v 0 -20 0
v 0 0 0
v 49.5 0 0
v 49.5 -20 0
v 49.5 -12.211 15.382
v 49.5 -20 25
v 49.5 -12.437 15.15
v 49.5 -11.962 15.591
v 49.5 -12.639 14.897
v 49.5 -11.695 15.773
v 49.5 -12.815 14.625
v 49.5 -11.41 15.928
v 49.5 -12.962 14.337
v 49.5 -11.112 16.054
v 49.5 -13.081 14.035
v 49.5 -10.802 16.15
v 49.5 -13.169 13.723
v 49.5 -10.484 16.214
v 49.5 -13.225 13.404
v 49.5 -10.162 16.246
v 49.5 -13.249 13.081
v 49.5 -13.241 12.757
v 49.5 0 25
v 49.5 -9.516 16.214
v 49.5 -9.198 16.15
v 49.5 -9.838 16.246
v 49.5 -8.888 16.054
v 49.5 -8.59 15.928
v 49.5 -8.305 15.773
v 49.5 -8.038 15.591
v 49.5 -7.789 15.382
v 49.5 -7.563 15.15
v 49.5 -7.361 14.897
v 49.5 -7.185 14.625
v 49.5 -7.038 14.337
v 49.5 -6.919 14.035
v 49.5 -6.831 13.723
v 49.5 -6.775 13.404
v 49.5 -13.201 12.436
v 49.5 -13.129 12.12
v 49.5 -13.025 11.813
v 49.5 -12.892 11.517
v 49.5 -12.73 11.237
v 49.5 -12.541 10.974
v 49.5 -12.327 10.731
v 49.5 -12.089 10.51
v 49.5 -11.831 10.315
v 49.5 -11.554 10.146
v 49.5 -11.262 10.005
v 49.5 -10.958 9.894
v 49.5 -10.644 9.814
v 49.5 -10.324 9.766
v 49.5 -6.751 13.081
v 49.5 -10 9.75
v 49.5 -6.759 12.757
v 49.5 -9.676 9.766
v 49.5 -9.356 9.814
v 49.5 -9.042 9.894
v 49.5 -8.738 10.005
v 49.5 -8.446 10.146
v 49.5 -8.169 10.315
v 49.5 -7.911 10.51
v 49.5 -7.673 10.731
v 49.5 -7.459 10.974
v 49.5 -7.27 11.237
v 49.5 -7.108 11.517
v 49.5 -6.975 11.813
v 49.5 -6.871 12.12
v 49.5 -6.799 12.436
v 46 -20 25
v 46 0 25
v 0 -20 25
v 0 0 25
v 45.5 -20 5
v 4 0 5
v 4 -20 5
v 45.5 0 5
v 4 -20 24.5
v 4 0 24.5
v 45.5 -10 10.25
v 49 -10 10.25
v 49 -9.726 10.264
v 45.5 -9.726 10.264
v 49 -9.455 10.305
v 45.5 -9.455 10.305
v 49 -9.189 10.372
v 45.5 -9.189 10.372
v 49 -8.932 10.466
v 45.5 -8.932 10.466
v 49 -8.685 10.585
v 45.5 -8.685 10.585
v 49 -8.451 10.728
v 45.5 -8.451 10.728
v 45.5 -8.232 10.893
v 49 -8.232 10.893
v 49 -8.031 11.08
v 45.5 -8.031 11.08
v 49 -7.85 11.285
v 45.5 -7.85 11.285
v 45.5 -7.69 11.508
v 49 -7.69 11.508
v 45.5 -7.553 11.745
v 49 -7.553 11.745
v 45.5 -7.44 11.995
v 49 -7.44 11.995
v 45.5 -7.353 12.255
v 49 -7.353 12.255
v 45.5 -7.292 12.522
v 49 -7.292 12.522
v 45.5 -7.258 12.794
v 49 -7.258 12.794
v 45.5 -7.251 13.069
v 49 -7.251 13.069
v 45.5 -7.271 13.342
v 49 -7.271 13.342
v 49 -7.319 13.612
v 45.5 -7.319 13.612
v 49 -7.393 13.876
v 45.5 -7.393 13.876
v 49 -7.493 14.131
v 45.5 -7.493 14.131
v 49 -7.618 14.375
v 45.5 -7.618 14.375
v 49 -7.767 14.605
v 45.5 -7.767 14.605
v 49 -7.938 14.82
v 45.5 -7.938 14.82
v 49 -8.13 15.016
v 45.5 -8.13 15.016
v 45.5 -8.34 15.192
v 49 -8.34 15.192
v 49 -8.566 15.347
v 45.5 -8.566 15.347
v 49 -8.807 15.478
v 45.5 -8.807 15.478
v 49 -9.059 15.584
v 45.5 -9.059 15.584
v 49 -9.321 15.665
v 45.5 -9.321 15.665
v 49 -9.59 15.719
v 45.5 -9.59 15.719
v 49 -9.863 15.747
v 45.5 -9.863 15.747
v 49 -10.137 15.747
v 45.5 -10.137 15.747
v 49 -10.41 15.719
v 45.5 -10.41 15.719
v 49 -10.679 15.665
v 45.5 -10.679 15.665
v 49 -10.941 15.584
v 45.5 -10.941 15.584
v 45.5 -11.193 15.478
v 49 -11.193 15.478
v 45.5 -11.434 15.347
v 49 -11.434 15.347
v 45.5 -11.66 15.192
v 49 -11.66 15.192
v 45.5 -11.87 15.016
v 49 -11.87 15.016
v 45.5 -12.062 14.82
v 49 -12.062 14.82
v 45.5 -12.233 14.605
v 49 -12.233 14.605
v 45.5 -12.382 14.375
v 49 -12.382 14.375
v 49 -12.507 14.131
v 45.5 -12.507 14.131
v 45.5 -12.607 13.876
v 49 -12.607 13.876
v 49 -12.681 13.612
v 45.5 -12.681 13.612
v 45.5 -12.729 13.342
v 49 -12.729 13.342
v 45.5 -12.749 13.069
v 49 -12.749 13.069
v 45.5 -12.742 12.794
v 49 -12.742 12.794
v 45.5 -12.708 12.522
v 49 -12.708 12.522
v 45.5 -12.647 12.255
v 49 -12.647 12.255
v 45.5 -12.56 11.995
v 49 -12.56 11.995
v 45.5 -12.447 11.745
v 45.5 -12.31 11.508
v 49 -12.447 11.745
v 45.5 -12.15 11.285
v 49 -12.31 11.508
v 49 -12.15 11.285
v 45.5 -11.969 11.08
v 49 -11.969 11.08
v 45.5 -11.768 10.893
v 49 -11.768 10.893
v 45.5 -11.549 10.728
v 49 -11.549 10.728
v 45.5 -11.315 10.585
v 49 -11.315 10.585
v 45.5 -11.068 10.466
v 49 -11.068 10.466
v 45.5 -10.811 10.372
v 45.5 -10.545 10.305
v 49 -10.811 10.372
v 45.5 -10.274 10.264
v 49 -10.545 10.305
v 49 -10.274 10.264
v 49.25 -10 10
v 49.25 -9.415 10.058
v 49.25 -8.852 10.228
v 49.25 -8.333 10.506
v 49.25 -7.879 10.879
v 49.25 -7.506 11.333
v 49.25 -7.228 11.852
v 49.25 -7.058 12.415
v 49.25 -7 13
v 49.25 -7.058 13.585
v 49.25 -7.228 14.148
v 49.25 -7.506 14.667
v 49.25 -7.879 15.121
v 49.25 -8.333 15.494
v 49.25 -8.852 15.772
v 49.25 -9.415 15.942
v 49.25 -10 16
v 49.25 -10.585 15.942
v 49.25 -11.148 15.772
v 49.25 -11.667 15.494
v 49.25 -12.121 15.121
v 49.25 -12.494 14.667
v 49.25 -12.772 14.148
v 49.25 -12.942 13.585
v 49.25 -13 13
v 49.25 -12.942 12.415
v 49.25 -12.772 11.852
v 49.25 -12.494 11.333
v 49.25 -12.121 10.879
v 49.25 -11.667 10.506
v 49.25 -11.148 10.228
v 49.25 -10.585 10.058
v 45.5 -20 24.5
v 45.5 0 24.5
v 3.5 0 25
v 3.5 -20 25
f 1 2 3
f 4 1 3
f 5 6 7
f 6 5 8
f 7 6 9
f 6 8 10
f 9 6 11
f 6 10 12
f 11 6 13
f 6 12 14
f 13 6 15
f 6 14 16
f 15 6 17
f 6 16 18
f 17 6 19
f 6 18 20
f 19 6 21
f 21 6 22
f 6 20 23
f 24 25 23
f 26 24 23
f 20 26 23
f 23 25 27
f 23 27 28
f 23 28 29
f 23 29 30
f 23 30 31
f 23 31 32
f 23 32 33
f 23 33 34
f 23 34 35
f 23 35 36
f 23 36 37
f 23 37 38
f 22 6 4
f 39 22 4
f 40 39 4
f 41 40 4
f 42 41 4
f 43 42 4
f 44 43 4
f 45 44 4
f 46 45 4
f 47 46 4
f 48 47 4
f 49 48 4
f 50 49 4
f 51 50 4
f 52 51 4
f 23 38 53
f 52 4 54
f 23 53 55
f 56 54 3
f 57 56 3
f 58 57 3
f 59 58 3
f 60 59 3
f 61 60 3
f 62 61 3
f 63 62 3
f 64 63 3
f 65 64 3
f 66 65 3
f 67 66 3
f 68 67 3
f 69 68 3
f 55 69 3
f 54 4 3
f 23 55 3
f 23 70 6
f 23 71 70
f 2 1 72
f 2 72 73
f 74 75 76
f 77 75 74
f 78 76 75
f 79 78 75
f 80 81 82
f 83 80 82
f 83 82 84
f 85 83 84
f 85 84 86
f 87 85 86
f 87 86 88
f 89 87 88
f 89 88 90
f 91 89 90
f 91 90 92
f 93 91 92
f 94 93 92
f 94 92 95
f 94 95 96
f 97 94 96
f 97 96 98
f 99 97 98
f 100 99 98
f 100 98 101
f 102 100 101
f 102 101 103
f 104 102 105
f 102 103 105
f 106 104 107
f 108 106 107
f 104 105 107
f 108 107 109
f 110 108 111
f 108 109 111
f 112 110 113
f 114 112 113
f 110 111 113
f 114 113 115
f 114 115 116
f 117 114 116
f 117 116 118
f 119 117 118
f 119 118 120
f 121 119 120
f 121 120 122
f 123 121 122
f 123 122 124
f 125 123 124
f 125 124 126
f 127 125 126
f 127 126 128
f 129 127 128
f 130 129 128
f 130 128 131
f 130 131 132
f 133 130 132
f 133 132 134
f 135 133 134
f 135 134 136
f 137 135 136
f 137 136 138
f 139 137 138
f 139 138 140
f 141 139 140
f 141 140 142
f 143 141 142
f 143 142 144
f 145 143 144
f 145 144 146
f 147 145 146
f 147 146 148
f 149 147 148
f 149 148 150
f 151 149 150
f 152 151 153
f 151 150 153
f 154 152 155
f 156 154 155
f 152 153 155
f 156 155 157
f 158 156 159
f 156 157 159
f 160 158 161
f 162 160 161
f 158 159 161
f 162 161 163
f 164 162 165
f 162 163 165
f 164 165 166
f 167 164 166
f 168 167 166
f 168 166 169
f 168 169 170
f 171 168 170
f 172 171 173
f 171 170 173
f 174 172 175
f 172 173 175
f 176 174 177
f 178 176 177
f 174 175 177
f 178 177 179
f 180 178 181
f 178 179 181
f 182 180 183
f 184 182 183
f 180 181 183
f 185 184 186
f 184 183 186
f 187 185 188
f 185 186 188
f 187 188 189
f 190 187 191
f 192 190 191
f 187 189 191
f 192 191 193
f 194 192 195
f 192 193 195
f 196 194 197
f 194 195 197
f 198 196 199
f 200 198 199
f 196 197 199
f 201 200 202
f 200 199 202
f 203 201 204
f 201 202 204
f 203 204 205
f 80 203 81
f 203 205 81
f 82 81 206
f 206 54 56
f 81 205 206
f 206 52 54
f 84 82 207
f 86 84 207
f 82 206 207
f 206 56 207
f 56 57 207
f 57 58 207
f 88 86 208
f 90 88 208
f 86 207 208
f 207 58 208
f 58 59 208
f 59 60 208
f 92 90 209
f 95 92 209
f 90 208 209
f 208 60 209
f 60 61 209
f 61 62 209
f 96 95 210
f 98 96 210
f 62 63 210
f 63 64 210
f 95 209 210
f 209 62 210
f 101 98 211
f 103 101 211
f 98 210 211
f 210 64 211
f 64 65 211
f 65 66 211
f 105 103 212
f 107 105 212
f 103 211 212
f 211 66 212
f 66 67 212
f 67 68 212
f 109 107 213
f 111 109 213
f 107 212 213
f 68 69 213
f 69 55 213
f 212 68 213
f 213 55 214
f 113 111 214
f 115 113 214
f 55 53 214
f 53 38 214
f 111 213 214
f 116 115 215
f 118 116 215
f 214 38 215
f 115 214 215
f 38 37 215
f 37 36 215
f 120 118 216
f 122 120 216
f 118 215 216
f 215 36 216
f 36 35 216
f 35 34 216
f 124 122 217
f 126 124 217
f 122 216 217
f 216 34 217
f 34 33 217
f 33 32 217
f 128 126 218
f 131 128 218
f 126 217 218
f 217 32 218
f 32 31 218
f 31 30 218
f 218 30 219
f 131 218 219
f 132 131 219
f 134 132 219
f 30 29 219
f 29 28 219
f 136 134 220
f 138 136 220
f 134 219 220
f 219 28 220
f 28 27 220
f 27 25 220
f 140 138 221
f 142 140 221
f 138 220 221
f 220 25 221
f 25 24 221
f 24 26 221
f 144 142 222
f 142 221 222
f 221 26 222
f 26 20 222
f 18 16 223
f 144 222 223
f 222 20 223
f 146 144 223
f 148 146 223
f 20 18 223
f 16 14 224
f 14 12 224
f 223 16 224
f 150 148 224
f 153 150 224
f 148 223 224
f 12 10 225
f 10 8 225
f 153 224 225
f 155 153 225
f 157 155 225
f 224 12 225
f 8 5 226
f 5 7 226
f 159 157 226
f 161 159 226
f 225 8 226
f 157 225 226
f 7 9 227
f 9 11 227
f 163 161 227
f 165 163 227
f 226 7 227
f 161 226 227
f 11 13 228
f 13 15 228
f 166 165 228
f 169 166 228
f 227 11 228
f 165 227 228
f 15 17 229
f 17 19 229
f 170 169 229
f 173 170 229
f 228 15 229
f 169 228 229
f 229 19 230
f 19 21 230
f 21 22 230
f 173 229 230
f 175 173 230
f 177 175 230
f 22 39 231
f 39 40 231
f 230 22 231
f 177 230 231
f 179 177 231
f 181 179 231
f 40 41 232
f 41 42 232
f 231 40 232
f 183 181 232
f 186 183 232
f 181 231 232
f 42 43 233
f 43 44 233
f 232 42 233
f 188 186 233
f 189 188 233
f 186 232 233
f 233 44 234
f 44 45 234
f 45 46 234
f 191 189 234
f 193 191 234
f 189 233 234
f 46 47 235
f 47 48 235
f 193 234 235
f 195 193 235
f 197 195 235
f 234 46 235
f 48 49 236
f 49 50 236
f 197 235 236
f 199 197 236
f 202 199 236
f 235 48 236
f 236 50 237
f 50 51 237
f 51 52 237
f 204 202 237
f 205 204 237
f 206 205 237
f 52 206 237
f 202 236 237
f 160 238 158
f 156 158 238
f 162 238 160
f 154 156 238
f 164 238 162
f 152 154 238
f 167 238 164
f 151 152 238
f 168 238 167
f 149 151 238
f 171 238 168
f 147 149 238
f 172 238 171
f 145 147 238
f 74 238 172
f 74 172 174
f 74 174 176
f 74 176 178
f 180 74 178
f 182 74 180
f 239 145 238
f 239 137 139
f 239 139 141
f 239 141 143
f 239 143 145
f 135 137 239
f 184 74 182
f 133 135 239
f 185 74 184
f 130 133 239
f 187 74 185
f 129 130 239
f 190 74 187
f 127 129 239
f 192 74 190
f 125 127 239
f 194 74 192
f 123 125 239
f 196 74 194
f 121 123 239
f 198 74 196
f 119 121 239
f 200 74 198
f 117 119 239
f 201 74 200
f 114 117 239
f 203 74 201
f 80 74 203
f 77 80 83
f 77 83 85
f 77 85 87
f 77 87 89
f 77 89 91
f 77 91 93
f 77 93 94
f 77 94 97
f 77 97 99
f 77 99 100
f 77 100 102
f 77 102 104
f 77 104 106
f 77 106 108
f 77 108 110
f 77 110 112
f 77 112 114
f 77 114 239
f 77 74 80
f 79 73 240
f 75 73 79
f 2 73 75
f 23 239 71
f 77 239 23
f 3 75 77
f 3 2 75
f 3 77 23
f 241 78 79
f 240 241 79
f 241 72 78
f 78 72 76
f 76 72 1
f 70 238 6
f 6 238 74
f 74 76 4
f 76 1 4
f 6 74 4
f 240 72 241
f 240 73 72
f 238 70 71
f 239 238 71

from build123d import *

# Parameters (mm, degrees)
SKETCH_1_W          = 49.5
SKETCH_1_H          = 20
EXTRUDE_1_DEPTH     = 5
SKETCH_3_W          = 4
SKETCH_3_H          = 20
EXTRUDE_2_DEPTH     = 20
CHAMFER_1_SIZE      = 0.5
SKETCH_4_R          = 2.75
CUT_EXTRUDE_1_DEPTH = 20
CHAMFER_2_SIZE      = 0.5


with BuildPart() as part:
    # 草图1 → 凸台-拉伸1 (new body)
    with BuildSketch(Plane.XY):
        with Locations((24.75, -10)):
            Rectangle(SKETCH_1_W, SKETCH_1_H)
    extrude(amount=EXTRUDE_1_DEPTH)

    # 草图3 → 凸台-拉伸2 (add)
    with BuildSketch(Plane.XY.offset(5)):
        with Locations((47.5, -10)):
            Rectangle(SKETCH_3_W, SKETCH_3_H)
        with Locations((2, -10)):
            Rectangle(SKETCH_3_W, SKETCH_3_H)
    extrude(amount=EXTRUDE_2_DEPTH)

    # 倒角1
    chamfer_1_edges = [part.edges().sort_by_distance(p)[0] for p in [
        (45.5, -10, 25),
        (4, -10, 25),
    ]]
    chamfer(chamfer_1_edges, length=CHAMFER_1_SIZE)

    # 草图4 → 切除-拉伸1 (cut)
    with BuildSketch(Plane(origin=(49.5, 0, 0), x_dir=(0, 0, -1), z_dir=(1, 0, 0))):
        with Locations((-13, -10)):
            Circle(SKETCH_4_R)
    extrude(amount=-CUT_EXTRUDE_1_DEPTH, mode=Mode.SUBTRACT)

    # 倒角2
    chamfer_2_edges = [part.edges().sort_by_distance(p)[0] for p in [
        (49.5, -10, 15.75),
    ]]
    chamfer(chamfer_2_edges, length=CHAMFER_2_SIZE)


solid = part.part
